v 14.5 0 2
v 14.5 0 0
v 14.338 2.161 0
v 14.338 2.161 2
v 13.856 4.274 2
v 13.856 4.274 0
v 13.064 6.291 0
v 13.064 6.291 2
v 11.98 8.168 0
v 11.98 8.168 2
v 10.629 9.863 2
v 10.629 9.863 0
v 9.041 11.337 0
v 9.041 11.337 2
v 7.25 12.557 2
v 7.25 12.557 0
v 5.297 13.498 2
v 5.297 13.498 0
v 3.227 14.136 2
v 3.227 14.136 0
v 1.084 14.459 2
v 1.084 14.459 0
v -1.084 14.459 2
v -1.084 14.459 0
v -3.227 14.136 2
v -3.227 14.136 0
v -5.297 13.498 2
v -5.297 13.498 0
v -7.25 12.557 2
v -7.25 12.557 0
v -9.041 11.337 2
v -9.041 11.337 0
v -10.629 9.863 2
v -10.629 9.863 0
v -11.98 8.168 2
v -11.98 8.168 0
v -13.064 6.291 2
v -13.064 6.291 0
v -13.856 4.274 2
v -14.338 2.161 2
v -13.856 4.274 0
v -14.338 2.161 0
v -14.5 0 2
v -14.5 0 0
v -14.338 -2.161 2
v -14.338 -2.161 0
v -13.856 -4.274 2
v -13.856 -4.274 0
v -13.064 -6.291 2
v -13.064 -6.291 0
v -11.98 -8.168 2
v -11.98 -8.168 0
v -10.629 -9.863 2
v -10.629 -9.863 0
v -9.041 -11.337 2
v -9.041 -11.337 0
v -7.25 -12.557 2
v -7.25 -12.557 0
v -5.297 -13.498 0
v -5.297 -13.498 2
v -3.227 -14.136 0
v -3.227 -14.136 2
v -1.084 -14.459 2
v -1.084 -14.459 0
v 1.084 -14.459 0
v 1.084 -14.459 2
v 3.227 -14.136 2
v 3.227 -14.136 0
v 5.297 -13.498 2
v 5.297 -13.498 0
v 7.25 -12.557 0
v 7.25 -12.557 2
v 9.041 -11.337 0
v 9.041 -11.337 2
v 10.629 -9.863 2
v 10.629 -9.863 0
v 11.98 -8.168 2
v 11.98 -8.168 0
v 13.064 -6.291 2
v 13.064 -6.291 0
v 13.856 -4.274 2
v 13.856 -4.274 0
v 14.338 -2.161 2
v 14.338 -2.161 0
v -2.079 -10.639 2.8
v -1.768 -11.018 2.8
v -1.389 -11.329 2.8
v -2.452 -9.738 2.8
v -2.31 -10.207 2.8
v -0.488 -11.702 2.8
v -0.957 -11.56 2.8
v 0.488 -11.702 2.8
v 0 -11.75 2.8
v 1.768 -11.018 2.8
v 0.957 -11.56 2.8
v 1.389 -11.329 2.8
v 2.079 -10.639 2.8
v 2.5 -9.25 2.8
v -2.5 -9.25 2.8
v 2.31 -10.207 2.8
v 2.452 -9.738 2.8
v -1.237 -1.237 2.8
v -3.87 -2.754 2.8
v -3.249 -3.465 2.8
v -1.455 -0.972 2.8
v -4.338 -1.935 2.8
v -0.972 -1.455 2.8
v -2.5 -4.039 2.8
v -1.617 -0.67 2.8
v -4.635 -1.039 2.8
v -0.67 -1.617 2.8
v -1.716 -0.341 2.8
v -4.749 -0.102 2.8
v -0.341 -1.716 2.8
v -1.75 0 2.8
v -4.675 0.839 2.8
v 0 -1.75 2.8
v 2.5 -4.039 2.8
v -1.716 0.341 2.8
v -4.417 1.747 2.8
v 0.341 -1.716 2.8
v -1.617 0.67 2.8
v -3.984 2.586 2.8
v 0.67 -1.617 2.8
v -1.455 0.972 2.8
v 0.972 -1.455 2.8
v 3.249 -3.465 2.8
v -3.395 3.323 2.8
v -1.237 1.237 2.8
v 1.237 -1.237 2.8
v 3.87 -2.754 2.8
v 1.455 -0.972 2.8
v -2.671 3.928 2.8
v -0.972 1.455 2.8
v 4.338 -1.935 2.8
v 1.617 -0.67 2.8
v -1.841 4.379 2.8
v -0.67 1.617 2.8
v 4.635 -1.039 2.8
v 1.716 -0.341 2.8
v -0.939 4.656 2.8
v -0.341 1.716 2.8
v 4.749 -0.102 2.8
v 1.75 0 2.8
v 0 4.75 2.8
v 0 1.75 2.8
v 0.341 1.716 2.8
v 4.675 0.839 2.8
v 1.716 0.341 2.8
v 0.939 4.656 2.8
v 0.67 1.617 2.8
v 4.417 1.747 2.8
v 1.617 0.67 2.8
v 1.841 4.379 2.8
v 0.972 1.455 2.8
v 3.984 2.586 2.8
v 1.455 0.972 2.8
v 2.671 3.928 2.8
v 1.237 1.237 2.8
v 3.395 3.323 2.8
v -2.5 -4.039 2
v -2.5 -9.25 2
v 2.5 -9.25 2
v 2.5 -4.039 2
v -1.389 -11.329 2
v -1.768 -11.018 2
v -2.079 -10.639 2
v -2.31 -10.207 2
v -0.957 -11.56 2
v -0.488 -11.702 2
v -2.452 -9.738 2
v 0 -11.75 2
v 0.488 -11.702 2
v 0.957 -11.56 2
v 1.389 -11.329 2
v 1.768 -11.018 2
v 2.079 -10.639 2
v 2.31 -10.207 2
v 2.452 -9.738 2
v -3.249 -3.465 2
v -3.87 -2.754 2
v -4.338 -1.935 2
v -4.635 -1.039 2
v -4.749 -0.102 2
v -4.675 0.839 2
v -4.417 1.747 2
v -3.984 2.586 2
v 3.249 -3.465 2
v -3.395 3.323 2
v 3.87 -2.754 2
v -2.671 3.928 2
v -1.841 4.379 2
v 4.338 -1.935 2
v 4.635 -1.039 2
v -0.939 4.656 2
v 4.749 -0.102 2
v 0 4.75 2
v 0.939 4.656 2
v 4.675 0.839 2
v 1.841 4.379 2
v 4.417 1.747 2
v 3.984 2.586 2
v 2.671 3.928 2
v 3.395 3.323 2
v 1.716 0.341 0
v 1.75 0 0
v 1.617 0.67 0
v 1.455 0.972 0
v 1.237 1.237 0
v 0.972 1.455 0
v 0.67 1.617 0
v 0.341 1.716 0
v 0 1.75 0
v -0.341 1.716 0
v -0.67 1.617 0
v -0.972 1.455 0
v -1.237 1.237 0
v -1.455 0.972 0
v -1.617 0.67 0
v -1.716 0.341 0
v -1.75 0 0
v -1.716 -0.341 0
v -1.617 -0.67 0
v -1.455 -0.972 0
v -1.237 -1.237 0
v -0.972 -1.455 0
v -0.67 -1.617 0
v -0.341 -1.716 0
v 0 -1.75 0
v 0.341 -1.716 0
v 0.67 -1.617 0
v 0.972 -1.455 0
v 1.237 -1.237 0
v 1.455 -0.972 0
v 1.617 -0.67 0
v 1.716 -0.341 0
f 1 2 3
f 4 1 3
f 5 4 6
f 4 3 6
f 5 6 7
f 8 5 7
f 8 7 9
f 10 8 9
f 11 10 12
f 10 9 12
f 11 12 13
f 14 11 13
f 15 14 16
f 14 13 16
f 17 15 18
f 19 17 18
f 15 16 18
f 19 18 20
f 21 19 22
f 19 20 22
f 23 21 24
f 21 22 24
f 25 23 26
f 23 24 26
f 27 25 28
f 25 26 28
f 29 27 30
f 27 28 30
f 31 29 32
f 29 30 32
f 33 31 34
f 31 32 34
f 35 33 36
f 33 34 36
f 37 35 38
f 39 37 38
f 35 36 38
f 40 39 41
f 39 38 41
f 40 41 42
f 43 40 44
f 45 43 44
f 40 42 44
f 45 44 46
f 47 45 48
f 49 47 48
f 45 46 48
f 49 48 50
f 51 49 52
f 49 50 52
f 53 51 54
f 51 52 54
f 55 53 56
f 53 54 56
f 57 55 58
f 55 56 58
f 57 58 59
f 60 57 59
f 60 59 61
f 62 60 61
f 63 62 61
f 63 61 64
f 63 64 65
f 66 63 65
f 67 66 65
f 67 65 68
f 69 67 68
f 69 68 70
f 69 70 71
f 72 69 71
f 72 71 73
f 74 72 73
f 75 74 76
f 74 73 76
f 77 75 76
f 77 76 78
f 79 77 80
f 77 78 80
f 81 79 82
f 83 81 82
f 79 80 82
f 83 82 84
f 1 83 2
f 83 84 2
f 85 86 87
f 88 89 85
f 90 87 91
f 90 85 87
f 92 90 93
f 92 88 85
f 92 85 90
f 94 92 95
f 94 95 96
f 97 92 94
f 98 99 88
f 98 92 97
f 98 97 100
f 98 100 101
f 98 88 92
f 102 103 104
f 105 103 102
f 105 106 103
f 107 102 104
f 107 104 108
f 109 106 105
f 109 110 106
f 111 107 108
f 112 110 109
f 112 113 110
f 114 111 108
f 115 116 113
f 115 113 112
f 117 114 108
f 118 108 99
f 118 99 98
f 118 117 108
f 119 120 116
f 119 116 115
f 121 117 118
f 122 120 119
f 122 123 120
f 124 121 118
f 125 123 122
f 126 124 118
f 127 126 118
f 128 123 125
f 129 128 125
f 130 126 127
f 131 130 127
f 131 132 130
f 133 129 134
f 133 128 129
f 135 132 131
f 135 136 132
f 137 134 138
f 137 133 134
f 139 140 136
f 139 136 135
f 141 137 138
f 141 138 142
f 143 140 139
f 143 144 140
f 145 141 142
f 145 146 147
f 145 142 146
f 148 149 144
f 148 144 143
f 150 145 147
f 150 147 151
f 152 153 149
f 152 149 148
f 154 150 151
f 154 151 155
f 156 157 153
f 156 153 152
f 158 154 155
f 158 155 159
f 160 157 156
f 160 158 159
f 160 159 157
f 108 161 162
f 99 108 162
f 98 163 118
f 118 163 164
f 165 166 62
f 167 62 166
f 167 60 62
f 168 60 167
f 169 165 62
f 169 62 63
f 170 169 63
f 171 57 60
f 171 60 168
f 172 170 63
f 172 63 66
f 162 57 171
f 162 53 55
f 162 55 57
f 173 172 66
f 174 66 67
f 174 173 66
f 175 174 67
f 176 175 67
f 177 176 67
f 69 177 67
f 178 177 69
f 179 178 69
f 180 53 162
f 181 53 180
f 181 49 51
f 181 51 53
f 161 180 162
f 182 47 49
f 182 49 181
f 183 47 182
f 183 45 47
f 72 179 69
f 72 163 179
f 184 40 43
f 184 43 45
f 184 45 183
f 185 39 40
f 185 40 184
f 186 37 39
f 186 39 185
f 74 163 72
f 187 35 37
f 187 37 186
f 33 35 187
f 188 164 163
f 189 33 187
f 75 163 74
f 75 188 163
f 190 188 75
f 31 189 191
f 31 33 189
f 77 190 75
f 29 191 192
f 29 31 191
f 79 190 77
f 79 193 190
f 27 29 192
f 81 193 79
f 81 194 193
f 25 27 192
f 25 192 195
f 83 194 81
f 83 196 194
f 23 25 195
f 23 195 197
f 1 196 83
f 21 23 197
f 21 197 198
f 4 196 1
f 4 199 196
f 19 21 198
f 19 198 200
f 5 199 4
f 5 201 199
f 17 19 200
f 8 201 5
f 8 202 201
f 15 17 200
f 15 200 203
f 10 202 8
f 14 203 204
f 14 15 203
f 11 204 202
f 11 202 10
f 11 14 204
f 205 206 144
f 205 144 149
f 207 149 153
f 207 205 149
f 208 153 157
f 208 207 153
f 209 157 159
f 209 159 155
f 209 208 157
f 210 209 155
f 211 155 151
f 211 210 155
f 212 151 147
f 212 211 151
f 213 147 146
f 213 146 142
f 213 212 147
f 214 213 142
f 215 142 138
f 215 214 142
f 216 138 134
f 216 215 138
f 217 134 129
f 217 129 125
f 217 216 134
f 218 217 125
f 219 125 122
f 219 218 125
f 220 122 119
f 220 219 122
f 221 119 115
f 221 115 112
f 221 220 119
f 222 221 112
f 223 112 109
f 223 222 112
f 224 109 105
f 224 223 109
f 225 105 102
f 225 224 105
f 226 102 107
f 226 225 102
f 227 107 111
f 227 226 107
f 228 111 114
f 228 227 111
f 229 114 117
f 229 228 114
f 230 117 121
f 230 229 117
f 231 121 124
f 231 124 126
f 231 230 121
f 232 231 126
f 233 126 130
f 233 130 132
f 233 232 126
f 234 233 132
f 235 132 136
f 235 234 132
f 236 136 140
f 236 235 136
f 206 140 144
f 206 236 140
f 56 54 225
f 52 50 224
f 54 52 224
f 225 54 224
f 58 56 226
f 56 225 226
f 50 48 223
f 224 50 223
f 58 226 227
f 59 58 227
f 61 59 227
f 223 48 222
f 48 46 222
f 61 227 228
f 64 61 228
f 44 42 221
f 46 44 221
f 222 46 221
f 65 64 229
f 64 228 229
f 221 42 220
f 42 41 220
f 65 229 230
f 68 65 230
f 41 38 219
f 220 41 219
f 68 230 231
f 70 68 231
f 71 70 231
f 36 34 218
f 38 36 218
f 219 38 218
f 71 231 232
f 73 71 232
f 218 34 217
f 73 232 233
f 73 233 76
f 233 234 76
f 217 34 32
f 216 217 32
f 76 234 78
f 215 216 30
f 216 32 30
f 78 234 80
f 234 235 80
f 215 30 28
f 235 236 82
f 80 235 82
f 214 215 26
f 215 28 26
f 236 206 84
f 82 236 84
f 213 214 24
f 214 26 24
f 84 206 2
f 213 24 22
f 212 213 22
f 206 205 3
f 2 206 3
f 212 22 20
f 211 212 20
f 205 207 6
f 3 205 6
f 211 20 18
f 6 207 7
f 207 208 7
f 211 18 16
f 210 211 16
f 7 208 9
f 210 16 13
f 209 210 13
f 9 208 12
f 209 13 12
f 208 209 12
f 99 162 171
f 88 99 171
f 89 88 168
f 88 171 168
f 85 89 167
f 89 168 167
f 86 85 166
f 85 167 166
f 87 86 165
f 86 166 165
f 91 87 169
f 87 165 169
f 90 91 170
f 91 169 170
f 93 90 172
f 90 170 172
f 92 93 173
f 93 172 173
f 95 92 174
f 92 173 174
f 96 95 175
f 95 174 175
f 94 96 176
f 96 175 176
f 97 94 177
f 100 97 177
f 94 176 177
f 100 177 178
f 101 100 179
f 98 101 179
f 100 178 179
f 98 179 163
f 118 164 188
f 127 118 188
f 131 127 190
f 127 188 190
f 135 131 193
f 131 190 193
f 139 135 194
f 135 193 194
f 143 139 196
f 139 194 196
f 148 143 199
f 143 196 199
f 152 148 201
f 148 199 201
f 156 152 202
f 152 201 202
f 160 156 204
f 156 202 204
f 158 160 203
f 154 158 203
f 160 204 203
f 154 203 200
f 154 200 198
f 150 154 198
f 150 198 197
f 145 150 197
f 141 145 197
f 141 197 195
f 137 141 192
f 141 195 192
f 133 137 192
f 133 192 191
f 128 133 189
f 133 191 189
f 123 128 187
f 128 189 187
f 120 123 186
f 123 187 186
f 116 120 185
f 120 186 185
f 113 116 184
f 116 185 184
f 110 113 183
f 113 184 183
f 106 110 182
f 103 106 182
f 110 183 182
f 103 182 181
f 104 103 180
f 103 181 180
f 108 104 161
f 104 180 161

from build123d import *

# Parameters (mm, degrees)
SKETCH_1_R          = 14.5
EXTRUDE_1_DEPTH     = 2
EXTRUDE_START       = 2
EXTRUDE_2_DEPTH     = 0.8
SKETCH_1_4_R        = 1.75
CUT_EXTRUDE_1_DEPTH = 2.8


with BuildPart() as part:
    # Эскиз1 → Бобышка-Вытянуть1 (new body)
    with BuildSketch(Plane.XY):
        Circle(SKETCH_1_R)
    extrude(amount=EXTRUDE_1_DEPTH)

    # Эскиз1<3> → Бобышка-Вытянуть2 (add)
    with BuildSketch(Plane.XY.offset(EXTRUDE_START)):
        with BuildLine():
            Line((-2.5, -4.038873605), (-2.5, -9.25))
            ThreePointArc((-2.5, -9.25), (0, -11.75), (2.5, -9.25))
            Line((2.5, -9.25), (2.5, -4.038873605))
            ThreePointArc((2.5, -4.038873605), (0, 4.75), (-2.5, -4.038873605))
        make_face()
    extrude(amount=EXTRUDE_2_DEPTH)

    # Эскиз1<4> → Вырез-Вытянуть1 (cut)
    with BuildSketch(Plane.XY):
        Circle(SKETCH_1_4_R)
    extrude(amount=CUT_EXTRUDE_1_DEPTH, mode=Mode.SUBTRACT)


solid = part.part
